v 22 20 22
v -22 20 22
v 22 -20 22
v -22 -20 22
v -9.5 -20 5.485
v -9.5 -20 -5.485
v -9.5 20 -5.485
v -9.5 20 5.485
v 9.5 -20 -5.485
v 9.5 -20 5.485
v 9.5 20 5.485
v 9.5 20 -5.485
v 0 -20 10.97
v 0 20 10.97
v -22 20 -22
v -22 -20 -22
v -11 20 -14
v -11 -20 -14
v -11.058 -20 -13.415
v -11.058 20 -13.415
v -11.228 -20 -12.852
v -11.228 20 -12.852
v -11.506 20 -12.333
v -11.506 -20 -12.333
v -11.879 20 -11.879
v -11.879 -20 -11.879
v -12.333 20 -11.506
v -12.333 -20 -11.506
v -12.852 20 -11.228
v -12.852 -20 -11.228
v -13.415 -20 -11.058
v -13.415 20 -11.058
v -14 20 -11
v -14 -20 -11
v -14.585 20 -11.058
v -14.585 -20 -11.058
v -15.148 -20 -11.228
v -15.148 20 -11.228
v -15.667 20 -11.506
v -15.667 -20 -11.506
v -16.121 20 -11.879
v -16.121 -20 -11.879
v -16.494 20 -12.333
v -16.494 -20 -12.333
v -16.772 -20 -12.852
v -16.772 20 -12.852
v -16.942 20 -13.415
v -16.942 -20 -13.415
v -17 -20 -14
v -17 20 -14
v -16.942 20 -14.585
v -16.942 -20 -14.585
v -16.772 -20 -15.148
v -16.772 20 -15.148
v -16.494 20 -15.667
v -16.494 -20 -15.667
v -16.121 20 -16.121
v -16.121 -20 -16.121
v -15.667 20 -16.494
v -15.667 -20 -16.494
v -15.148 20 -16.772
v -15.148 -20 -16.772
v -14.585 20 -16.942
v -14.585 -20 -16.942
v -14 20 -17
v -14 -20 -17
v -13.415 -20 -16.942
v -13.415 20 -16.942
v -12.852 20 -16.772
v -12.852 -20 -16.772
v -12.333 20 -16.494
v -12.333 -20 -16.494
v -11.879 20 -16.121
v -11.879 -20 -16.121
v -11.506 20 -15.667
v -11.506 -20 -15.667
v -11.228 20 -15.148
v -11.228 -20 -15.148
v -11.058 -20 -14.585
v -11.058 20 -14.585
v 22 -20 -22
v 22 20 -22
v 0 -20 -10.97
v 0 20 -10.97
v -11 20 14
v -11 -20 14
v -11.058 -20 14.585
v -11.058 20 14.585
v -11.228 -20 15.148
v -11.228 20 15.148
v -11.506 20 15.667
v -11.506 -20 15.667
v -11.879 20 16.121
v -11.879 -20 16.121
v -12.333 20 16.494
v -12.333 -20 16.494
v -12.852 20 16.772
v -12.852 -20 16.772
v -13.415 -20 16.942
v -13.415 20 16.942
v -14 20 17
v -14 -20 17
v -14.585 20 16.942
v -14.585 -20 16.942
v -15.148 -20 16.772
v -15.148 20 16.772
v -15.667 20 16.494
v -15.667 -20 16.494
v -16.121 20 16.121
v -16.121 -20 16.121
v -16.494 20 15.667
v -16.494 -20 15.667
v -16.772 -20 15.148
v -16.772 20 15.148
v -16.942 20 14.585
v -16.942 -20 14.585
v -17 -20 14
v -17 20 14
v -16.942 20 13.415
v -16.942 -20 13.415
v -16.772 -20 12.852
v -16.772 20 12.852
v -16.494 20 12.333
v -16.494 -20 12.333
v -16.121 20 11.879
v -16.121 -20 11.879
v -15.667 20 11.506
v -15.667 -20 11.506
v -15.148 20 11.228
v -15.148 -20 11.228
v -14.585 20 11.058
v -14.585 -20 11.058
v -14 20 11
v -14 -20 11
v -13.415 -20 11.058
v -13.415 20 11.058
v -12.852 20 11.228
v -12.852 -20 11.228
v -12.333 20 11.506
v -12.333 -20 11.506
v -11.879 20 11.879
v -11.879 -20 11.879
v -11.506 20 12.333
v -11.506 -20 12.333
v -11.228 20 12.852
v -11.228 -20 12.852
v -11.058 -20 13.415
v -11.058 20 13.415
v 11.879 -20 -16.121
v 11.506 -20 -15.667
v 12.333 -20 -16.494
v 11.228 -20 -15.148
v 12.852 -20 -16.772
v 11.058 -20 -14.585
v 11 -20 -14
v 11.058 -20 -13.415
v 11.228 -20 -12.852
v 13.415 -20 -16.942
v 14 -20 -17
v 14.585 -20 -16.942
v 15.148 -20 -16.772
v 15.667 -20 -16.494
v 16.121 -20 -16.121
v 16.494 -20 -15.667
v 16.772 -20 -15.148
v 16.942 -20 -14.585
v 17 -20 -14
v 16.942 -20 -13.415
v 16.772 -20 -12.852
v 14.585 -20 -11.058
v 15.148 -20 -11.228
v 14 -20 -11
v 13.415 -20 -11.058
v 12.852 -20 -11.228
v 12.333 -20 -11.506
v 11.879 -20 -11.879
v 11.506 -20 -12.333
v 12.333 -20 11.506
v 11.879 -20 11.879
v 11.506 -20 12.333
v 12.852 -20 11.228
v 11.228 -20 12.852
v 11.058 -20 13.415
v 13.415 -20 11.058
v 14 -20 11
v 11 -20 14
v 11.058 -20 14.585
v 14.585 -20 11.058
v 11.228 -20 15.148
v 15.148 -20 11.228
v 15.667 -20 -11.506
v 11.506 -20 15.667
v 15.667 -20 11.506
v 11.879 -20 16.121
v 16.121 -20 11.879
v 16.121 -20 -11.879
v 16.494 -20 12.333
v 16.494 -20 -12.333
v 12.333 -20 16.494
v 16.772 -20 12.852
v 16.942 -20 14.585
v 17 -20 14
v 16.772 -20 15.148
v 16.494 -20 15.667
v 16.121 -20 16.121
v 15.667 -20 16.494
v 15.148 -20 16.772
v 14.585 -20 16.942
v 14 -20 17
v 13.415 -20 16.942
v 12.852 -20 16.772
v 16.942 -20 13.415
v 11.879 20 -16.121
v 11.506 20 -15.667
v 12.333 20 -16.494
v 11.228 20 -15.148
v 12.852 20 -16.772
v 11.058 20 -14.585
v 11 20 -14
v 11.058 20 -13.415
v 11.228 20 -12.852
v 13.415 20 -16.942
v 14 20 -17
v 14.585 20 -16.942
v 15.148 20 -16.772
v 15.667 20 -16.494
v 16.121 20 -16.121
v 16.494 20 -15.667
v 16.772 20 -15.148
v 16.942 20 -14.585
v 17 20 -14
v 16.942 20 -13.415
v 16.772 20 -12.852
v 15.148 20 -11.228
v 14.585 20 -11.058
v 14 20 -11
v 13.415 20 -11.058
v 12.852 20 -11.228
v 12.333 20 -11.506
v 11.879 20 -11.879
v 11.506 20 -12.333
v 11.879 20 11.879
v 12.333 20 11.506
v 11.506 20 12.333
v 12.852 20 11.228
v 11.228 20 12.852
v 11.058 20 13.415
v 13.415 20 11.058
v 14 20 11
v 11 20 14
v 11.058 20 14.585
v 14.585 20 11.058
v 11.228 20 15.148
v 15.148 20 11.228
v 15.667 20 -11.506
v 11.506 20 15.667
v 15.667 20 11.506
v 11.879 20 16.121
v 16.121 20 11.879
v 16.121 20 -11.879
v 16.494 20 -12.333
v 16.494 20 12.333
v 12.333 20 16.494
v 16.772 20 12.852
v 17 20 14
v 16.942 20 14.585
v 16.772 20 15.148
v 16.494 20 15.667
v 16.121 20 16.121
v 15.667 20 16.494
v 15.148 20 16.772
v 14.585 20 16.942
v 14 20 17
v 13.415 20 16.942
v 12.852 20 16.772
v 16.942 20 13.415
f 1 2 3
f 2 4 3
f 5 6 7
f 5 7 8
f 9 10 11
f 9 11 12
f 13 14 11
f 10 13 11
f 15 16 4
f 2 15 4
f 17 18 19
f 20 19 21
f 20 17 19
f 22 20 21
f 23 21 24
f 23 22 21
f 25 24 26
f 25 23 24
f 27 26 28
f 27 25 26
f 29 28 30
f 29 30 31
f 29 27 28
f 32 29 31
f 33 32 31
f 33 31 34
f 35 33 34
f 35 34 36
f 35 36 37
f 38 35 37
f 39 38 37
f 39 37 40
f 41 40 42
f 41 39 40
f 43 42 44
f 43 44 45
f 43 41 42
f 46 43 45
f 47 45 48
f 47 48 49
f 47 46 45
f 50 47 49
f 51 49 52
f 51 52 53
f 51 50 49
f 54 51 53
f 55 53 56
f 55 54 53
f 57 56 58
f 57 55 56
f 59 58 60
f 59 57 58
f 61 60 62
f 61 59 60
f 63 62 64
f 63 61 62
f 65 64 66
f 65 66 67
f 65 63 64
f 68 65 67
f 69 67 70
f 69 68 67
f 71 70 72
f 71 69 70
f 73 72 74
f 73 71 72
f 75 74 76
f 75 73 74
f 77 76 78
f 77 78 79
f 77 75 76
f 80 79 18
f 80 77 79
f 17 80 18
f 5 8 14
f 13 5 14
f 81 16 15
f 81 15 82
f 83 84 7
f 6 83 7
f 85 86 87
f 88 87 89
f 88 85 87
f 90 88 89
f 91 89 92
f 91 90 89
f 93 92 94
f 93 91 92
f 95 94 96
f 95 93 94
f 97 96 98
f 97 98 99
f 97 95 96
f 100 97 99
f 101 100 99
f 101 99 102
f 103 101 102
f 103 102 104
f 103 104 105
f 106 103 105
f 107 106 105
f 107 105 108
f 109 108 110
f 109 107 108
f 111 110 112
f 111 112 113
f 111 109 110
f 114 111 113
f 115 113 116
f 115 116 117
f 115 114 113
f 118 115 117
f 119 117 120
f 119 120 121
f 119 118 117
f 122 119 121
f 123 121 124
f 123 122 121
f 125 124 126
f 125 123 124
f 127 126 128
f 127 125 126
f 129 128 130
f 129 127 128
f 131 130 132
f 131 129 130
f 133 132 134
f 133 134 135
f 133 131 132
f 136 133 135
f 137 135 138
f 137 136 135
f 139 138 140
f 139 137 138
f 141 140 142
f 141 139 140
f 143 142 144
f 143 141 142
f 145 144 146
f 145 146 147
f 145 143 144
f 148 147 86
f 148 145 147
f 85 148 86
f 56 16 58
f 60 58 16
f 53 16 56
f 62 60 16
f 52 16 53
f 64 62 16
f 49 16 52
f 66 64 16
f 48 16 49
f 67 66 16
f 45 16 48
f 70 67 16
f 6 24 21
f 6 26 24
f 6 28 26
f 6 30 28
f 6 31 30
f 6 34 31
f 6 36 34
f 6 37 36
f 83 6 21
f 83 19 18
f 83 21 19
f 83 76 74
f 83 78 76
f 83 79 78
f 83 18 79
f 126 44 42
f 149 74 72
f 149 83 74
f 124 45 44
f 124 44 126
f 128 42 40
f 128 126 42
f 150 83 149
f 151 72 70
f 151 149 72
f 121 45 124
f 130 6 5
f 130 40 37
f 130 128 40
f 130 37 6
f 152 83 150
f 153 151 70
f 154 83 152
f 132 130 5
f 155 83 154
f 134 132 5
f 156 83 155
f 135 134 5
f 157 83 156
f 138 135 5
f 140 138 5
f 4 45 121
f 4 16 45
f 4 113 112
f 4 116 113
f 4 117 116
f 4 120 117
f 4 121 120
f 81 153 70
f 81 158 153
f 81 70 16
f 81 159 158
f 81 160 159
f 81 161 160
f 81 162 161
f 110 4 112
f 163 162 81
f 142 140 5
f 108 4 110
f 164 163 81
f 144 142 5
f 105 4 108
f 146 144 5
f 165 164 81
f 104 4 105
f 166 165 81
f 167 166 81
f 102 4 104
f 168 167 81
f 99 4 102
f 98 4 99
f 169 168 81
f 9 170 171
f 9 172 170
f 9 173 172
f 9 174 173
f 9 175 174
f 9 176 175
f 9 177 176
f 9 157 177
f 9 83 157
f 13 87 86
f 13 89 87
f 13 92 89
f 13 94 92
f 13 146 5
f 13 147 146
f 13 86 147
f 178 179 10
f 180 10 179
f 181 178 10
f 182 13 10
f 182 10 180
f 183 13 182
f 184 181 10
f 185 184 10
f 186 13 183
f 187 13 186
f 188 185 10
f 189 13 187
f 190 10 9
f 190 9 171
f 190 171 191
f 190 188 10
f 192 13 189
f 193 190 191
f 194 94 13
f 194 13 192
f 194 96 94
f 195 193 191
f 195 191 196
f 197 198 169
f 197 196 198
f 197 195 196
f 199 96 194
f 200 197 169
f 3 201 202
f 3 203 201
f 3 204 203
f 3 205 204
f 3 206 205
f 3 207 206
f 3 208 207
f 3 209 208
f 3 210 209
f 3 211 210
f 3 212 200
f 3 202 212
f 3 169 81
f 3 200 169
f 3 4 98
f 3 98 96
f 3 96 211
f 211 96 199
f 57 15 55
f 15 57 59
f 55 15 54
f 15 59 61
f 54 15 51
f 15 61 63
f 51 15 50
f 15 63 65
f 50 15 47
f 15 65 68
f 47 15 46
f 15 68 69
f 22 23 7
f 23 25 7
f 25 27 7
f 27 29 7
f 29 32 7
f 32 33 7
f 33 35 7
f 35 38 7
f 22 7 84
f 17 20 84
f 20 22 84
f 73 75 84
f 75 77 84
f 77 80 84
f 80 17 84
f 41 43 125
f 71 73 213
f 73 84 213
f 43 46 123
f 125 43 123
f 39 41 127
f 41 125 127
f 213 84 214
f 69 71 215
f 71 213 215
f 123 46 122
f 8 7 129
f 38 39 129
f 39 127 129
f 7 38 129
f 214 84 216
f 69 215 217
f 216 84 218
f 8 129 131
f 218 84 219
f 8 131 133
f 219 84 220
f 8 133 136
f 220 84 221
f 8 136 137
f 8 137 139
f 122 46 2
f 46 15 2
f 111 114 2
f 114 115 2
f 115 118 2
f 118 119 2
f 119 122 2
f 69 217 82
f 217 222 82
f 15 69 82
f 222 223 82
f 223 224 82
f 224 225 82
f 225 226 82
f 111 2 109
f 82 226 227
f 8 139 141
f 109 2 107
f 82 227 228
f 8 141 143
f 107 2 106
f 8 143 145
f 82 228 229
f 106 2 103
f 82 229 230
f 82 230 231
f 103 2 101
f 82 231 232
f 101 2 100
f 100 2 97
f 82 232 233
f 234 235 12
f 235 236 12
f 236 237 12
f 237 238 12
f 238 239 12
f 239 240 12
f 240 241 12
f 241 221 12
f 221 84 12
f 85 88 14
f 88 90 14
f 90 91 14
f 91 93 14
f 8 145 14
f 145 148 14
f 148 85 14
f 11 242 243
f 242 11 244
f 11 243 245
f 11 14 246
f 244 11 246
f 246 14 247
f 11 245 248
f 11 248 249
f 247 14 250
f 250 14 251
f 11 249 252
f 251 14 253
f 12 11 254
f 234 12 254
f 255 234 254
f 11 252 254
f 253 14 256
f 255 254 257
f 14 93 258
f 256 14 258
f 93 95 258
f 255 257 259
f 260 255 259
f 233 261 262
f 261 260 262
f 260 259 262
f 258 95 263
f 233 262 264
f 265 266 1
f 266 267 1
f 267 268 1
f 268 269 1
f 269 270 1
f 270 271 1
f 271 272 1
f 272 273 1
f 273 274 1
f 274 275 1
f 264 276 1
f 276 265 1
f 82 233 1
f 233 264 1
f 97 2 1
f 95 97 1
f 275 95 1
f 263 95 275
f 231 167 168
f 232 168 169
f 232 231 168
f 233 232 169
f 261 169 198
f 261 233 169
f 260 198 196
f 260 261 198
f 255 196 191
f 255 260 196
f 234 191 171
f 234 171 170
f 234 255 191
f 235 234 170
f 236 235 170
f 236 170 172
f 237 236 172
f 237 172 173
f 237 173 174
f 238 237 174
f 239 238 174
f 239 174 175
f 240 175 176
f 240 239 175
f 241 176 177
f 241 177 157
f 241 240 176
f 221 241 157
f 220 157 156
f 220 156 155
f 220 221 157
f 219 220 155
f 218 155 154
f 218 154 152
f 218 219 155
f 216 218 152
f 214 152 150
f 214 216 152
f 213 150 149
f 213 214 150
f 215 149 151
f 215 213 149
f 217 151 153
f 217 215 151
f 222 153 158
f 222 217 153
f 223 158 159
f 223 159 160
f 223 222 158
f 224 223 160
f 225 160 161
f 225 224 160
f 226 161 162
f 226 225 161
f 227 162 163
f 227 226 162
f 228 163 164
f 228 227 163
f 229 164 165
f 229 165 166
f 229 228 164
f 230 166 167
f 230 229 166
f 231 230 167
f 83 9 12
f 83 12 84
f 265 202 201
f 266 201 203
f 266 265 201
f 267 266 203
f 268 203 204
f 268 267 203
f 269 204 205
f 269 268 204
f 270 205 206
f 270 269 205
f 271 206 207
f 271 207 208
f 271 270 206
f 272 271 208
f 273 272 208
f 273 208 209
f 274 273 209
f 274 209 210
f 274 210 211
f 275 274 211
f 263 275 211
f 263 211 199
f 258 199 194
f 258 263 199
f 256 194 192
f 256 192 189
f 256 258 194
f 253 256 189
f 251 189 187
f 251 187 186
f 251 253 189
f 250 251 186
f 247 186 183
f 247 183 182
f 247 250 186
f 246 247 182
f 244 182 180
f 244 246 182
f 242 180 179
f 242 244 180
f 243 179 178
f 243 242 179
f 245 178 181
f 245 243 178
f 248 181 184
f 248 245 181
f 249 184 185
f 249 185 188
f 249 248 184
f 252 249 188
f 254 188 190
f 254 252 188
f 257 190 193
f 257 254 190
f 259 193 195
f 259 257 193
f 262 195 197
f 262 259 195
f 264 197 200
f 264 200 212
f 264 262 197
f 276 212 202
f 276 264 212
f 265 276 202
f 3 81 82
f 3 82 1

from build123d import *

# Parameters (mm, degrees)
F0_W     = 44
F0_H     = 44
F0_R     = 3
F1_DEPTH = 20


with BuildPart() as f1:
    # F0 (on Front) → F1 (new body, symmetric)
    with BuildSketch(Plane.XZ):
        Rectangle(F0_W, F0_H)
        with Locations((-14, -14)):
            Circle(F0_R, mode=Mode.SUBTRACT)
        with Locations((14, -14)):
            Circle(F0_R, mode=Mode.SUBTRACT)
        with Locations((-14, 14)):
            Circle(F0_R, mode=Mode.SUBTRACT)
        Polygon((0, 10.9696551146), (9.5, 5.4848275573), (9.5, -5.4848275573), (0, -10.9696551146), (-9.5, -5.4848275573), (-9.5, 5.4848275573), align=None, mode=Mode.SUBTRACT)
        with Locations((14, 14)):
            Circle(F0_R, mode=Mode.SUBTRACT)
    extrude(amount=F1_DEPTH, both=True)


solid = f1.part
